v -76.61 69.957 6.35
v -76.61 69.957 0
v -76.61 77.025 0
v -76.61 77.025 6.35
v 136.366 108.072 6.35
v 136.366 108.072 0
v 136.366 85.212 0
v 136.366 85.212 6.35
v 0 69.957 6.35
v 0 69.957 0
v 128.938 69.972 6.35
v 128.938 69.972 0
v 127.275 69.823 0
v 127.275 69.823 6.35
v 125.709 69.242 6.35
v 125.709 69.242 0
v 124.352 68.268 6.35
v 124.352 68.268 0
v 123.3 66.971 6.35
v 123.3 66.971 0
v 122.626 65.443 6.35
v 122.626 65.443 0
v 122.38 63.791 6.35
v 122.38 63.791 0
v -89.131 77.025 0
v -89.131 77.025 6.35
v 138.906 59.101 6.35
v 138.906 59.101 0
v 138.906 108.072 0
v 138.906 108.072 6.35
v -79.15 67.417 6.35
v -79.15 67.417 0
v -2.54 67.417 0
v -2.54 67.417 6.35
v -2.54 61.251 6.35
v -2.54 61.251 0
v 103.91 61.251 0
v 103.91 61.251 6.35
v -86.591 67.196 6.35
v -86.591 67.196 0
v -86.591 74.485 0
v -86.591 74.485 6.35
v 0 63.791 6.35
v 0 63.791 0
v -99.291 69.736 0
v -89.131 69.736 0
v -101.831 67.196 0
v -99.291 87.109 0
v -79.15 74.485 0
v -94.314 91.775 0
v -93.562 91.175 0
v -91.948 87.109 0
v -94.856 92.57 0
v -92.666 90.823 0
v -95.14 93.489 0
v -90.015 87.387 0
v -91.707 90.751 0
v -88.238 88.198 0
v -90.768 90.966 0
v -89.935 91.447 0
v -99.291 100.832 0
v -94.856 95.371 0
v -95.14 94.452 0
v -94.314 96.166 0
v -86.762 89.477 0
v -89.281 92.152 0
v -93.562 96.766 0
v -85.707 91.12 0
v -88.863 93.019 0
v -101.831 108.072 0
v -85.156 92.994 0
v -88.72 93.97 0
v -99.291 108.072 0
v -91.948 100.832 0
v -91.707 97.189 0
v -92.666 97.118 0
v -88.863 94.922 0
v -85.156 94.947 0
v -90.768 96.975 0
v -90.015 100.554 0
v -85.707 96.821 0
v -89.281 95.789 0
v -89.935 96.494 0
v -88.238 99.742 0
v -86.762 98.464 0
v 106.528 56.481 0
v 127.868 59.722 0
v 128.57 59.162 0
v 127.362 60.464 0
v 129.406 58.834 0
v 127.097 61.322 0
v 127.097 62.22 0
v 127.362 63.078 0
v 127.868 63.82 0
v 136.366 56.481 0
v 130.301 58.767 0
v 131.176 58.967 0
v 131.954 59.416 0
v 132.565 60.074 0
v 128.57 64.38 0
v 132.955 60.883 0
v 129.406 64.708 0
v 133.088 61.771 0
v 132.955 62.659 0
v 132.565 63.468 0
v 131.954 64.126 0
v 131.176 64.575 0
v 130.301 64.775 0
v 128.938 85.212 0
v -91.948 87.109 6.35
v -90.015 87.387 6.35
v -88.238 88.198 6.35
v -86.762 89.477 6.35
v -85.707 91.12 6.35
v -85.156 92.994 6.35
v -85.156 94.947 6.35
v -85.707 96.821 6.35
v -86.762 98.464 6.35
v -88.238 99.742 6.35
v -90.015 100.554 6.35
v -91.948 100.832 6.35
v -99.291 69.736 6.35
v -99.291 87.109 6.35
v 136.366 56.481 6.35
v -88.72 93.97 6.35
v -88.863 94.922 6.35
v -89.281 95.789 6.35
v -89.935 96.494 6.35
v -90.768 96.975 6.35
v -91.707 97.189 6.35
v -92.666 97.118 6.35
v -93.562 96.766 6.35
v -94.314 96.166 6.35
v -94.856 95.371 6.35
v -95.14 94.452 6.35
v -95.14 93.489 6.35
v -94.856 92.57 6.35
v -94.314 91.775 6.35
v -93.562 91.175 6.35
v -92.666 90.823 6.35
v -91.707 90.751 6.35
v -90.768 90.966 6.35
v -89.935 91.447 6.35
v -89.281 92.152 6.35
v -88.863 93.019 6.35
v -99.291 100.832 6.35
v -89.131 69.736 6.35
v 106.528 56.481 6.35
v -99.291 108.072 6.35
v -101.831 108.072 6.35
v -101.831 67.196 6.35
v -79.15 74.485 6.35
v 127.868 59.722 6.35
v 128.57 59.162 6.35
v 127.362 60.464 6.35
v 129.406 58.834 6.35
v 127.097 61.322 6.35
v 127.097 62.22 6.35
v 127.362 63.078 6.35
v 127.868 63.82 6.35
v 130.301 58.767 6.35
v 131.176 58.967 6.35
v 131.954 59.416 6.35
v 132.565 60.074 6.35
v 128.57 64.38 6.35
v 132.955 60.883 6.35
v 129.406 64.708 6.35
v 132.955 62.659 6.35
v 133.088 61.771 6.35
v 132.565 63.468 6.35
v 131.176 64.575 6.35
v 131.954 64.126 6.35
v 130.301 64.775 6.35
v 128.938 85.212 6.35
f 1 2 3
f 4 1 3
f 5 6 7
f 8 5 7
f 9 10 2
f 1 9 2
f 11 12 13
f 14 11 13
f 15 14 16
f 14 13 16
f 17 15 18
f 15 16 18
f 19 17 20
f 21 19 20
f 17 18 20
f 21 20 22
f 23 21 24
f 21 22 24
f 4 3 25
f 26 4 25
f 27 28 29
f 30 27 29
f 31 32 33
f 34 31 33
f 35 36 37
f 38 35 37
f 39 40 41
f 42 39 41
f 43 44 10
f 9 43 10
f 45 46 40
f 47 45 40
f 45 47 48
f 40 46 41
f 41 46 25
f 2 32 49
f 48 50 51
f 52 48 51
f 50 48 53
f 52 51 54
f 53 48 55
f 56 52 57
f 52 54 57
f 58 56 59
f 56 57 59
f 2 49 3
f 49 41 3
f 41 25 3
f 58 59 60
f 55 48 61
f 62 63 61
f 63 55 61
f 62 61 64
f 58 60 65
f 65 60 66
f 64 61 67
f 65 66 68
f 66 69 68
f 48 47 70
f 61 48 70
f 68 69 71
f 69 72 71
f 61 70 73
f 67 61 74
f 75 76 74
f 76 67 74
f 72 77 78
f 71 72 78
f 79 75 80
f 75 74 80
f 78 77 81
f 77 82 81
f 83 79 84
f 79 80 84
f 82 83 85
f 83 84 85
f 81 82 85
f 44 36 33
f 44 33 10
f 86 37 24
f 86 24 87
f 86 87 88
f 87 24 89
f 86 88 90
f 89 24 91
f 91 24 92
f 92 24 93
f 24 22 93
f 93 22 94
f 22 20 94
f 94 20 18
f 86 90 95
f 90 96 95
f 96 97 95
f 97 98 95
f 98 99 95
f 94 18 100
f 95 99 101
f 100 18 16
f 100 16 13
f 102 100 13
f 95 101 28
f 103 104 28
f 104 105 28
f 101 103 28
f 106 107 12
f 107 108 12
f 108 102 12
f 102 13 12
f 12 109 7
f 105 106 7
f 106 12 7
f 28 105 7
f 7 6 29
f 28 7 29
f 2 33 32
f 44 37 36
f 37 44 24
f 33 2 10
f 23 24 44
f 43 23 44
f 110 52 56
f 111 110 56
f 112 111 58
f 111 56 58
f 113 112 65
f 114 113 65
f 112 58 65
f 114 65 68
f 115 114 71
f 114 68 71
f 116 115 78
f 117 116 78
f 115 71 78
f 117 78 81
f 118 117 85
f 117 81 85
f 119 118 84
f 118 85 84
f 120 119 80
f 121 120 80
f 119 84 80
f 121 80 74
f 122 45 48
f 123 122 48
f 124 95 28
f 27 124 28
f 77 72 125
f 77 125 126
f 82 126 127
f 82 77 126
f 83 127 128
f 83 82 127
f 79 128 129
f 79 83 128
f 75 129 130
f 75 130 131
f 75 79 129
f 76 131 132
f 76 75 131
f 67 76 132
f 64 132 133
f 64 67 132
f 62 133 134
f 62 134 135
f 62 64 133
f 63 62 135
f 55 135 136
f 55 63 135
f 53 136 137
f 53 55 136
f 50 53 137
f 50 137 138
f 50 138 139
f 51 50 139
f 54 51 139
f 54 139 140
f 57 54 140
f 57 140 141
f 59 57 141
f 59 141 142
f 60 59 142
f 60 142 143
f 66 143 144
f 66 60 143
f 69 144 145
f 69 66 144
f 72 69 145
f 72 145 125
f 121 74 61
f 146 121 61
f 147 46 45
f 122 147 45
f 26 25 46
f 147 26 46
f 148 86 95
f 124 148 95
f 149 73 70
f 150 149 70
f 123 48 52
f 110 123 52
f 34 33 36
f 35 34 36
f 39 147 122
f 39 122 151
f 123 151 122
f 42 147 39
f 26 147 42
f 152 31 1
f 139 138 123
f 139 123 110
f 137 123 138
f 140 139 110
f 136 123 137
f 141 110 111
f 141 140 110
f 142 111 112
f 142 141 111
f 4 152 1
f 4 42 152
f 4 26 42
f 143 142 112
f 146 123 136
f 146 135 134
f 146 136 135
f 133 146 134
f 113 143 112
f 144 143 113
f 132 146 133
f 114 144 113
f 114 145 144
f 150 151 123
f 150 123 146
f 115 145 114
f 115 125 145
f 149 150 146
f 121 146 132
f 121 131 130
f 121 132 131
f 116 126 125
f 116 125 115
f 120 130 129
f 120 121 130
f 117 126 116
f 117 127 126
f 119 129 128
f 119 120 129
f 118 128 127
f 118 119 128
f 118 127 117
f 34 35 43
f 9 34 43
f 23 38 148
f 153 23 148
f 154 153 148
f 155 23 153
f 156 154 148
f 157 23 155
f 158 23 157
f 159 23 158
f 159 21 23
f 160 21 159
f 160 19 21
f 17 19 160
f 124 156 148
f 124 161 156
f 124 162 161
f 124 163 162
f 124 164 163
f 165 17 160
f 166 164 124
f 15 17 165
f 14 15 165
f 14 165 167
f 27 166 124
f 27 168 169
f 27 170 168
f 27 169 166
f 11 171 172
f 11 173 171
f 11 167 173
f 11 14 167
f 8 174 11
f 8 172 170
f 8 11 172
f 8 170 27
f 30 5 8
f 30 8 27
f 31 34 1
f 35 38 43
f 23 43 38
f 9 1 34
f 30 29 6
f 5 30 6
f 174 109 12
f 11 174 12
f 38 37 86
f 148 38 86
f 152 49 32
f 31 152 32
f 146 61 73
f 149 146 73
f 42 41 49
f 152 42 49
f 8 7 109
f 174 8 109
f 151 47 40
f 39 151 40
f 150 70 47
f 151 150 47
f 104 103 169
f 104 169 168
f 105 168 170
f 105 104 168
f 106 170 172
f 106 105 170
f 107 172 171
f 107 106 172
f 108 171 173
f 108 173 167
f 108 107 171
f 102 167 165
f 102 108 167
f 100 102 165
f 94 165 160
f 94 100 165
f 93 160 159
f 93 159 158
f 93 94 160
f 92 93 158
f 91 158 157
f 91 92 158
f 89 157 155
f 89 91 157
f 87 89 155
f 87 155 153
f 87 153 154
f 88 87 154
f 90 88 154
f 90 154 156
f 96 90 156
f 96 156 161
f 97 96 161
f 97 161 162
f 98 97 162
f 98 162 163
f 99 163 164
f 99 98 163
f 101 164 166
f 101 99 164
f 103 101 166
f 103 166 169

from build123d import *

# Parameters (mm, degrees)
F1_R     = 3.228028
F1_R_2   = 3.012468
F2_DEPTH = 6.35


with BuildPart() as f2:
    # F1 (on face) → F2 (new body)
    with BuildSketch(Plane.XY):
        with BuildLine():
            ThreePointArc((-91.947787, 87.109275), (-85.086599, 93.970463), (-91.947787, 100.83165))
            Line((-91.947787, 100.83165), (-99.291265, 100.83165))
            Line((-99.291265, 100.83165), (-99.291265, 108.071581))
            Line((-99.291265, 108.071581), (-101.831265, 108.071581))
            Line((-101.831265, 108.071581), (-101.831265, 67.195773))
            Line((-101.831265, 67.195773), (-86.591265, 67.195773))
            Line((-86.591265, 67.195773), (-86.591265, 74.484758))
            Line((-86.591265, 74.484758), (-83.508379, 74.484758))
            Line((-83.508379, 74.484758), (-83.508379, 77.024758))
            Line((-83.508379, 77.024758), (-89.131265, 77.024758))
            Line((-89.131265, 77.024758), (-89.131265, 69.735773))
            Line((-89.131265, 69.735773), (-99.291265, 69.735773))
            Line((-99.291265, 69.735773), (-99.291265, 87.109275))
            Line((-99.291265, 87.109275), (-91.947787, 87.109275))
        make_face()
        with Locations((-91.947787, 93.970463)):
            Circle(F1_R, mode=Mode.SUBTRACT)
        with BuildLine():
            Line((-76.610117, 77.024758), (-83.508379, 77.024758))
            Line((-83.508379, 77.024758), (-83.508379, 74.484758))
            Line((-83.508379, 74.484758), (-79.150117, 74.484758))
            Line((-79.150117, 74.484758), (-79.150117, 67.417324))
            Line((-79.150117, 67.417324), (-2.54, 67.417324))
            Line((-2.54, 67.417324), (-2.54, 61.251126))
            Line((-2.54, 61.251126), (103.91023, 61.251126))
            Line((103.91023, 61.251126), (106.528006, 56.480713))
            Line((106.528006, 56.480713), (136.366479, 56.480713))
            Line((136.366479, 56.480713), (138.906479, 59.101462))
            Line((138.906479, 59.101462), (138.906479, 108.071581))
            Line((138.906479, 108.071581), (136.366479, 108.071581))
            Line((136.366479, 108.071581), (136.366479, 85.211581))
            Line((136.366479, 85.211581), (128.938311, 85.211581))
            Line((128.938311, 85.211581), (128.938311, 69.971581))
            ThreePointArc((128.938311, 69.971581), (124.35225, 68.268028), (122.379587, 63.791126))
            Line((122.379587, 63.791126), (104.599587, 63.791126))
            Line((104.599587, 63.791126), (0, 63.791126))
            Line((0, 63.791126), (0, 69.957324))
            Line((0, 69.957324), (-76.610117, 69.957324))
            Line((-76.610117, 69.957324), (-76.610117, 77.024758))
        make_face()
        with Locations((130.075902, 61.770894)):
            Circle(F1_R_2, mode=Mode.SUBTRACT)
    extrude(amount=F2_DEPTH)


solid = f2.part
